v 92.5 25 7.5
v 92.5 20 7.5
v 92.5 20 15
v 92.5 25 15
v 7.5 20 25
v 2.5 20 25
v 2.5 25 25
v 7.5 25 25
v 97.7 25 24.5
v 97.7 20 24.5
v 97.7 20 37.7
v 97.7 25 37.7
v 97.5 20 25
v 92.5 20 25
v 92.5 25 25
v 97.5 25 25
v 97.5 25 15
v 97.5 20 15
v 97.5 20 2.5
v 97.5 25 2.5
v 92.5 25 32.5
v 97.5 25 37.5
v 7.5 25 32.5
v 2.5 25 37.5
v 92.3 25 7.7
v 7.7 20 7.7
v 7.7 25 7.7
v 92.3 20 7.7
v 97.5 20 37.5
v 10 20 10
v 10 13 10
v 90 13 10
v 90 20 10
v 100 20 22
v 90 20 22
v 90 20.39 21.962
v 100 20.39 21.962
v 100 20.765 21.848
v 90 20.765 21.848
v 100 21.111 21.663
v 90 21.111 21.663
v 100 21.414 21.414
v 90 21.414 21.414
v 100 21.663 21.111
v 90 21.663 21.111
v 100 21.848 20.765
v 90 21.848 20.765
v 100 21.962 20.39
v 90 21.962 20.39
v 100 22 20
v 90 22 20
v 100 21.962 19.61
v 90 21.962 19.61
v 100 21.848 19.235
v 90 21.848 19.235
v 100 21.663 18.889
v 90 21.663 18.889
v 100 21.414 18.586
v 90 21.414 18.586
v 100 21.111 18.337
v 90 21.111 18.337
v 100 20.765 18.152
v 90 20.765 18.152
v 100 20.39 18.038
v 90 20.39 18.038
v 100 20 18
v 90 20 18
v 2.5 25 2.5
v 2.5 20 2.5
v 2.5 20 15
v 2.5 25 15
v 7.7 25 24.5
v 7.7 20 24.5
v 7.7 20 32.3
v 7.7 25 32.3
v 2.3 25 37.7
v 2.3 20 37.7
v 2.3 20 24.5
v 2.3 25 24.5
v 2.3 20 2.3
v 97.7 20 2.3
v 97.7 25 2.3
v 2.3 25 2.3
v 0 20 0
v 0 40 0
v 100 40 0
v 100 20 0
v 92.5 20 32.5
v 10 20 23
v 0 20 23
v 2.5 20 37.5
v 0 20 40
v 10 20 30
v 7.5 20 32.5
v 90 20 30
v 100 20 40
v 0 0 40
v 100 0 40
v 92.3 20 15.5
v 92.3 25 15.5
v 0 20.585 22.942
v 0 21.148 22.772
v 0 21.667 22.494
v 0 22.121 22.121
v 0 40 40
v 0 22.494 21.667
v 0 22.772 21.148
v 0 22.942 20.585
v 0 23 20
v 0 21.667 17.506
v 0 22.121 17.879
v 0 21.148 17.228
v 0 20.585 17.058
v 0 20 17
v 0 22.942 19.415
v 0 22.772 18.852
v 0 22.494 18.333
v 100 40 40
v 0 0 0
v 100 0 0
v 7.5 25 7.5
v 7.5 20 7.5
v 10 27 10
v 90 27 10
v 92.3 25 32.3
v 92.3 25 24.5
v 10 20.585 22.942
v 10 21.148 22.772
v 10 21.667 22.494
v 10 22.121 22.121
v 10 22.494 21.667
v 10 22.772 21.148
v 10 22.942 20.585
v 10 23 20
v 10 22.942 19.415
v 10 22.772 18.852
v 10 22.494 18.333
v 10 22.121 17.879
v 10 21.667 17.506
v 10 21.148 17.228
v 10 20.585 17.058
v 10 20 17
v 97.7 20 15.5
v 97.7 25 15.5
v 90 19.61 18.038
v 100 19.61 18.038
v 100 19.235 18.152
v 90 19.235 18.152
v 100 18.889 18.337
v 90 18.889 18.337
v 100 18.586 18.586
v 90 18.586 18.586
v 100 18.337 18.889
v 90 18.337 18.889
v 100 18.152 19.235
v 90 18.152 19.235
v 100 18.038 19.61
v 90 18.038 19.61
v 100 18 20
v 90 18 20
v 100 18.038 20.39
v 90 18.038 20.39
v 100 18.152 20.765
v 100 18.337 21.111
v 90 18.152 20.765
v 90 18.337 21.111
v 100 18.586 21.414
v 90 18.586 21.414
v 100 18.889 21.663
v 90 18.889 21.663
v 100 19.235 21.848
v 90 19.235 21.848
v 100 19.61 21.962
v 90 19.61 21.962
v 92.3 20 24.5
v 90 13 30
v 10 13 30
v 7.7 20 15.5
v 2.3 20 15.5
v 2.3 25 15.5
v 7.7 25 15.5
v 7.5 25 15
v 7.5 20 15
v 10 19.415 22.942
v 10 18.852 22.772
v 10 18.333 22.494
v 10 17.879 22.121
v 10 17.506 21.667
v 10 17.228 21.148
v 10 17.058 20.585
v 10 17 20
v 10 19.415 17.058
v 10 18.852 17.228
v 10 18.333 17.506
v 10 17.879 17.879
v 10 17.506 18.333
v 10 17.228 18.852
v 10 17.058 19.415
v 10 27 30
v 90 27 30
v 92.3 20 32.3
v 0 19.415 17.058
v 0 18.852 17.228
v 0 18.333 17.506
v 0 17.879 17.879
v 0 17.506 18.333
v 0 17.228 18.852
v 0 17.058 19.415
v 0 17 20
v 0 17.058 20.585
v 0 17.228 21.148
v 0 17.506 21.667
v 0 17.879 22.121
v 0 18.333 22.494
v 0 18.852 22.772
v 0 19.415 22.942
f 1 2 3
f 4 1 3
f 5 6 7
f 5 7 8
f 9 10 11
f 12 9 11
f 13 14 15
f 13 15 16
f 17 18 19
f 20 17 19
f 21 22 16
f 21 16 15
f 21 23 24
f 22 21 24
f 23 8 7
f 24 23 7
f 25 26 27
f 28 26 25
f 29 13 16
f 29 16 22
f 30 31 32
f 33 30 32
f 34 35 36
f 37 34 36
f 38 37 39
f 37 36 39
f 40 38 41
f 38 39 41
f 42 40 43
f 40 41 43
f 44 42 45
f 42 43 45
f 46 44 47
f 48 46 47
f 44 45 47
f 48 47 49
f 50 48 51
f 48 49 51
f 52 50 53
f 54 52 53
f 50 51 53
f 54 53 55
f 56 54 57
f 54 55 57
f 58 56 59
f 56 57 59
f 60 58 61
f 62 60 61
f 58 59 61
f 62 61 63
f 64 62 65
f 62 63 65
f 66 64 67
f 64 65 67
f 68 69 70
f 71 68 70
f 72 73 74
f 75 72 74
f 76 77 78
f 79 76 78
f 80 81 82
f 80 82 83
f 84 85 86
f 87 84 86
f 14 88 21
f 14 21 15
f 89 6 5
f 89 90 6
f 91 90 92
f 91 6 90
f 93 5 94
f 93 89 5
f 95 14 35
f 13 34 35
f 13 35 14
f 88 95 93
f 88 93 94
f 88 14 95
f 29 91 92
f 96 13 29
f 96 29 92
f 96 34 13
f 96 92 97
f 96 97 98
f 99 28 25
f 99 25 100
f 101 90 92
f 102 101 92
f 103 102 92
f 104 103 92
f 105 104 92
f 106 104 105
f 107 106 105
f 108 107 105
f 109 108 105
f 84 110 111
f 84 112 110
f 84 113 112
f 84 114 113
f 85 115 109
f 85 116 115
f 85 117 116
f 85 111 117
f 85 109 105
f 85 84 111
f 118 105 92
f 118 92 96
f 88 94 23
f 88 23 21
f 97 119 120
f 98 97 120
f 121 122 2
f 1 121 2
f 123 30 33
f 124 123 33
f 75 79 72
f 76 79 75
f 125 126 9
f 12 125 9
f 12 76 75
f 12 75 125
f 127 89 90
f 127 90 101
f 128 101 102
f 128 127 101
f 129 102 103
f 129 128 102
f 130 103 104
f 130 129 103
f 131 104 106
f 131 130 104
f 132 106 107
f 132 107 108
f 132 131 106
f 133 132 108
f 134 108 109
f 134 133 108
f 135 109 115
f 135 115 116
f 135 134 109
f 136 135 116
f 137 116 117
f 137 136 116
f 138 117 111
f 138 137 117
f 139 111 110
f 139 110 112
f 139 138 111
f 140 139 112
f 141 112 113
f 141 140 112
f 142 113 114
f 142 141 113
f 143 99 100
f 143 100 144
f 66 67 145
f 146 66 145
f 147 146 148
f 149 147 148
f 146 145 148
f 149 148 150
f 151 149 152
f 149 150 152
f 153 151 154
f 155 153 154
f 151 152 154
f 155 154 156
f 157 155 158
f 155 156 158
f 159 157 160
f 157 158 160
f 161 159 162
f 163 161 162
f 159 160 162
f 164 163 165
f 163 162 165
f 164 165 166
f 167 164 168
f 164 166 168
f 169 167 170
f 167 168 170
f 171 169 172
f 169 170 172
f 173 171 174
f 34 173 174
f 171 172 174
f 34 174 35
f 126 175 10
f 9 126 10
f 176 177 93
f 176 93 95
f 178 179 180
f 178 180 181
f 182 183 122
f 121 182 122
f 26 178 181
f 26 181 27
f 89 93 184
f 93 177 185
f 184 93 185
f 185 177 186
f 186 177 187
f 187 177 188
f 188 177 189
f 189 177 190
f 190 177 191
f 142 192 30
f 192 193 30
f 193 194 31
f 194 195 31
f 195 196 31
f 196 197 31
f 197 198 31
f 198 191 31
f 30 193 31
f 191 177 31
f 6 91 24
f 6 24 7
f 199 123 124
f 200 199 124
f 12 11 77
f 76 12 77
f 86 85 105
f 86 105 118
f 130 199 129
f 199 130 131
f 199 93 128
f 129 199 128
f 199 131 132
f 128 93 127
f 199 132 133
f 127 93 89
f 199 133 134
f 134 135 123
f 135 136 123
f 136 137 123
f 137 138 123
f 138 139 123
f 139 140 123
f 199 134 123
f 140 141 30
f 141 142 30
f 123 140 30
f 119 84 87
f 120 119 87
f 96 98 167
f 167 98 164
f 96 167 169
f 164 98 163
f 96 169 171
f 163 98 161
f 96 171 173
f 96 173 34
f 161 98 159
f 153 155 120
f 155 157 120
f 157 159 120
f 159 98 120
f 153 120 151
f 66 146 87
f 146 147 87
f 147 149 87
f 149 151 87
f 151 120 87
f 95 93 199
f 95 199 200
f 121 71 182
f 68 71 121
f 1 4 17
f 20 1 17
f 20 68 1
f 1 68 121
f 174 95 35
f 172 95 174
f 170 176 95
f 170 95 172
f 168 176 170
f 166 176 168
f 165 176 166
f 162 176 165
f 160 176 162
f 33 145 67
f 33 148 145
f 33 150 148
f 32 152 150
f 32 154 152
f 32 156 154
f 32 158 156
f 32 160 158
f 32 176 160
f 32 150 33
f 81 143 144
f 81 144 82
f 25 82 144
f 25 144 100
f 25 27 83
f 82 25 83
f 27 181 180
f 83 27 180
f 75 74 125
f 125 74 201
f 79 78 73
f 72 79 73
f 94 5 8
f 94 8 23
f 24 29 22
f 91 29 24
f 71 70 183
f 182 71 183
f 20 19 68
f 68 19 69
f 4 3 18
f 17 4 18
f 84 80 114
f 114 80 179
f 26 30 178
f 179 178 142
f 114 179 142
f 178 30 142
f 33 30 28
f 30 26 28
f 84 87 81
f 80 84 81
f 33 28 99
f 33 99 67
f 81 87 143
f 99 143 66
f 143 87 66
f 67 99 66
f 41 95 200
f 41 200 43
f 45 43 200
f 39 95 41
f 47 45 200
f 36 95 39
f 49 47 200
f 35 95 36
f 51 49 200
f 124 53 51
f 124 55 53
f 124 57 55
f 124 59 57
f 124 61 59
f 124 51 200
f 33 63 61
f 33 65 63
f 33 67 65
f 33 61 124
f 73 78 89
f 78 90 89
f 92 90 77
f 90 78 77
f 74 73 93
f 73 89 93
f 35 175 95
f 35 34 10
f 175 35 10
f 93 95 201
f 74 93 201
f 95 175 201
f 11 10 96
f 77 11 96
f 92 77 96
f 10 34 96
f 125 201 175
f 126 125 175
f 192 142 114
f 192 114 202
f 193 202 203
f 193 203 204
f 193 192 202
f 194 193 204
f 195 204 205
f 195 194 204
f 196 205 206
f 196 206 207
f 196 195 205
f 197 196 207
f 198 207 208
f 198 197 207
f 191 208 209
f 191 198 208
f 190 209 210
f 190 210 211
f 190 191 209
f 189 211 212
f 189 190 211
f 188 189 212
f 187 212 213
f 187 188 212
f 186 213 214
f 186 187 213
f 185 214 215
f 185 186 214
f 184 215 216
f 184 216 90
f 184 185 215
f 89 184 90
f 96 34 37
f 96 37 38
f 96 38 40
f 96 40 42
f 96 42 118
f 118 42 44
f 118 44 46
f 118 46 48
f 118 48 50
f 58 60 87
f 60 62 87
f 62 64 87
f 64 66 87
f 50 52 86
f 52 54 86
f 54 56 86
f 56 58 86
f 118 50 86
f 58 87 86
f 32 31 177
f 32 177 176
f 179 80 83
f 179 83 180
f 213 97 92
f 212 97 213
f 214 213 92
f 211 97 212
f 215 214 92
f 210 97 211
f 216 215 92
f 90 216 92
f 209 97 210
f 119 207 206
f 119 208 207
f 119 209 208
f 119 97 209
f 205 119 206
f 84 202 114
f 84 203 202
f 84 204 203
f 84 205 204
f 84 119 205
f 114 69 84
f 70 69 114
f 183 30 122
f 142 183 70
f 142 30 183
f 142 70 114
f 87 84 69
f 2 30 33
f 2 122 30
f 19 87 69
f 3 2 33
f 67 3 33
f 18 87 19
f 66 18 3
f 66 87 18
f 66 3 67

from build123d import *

# Parameters (mm, degrees)
SKETCH_1_W               = 100
SKETCH_1_H               = 40
EXTRUDE_1_DEPTH          = 40
CUT_EXTRUDE_1_DEPTH      = 7
CUT_EXTRUDE_1_DEPTH_BACK = 7
SKETCH_2_W               = 80
SKETCH_2_H               = 20
EXTRUDE_2_DEPTH          = 5
CUT_EXTRUDE_2_DEPTH      = 5
SKETCH_6_R               = 2
CUT_EXTRUDE_3_DEPTH      = 115.891252931
CUT_EXTRUDE_START        = -10
SKETCH_7_R               = 3
CUT_EXTRUDE_4_DEPTH      = 10


with BuildPart() as part:
    # ｽｹｯﾁ1 → ﾎﾞｽ - 押し出し1 (new body)
    with BuildSketch(Plane.XY):
        with Locations((50, 20)):
            Rectangle(SKETCH_1_W, SKETCH_1_H)
    extrude(amount=EXTRUDE_1_DEPTH)


with BuildPart() as body_2:
    # Split Bodies 1: the piece on the far side of the plane
    add(part.part)
    split(bisect_by=Plane.ZX.offset(20), keep=Keep.BOTTOM)


with BuildPart() as part_1:
    add(part.part)

    # Split Bodies 1
    split(bisect_by=Plane.ZX.offset(20), keep=Keep.TOP)


with BuildPart() as cut_extrude_1_tool:
    # ｽｹｯﾁ2 → ｶｯﾄ - 押し出し1 (new, two sides: drawn at the far end of the back side and taken through both)
    with BuildSketch(Plane(origin=(0, 20, 0), x_dir=(1, 0, 0), z_dir=(0, 1, 0)).offset(-CUT_EXTRUDE_1_DEPTH_BACK)):
        with Locations((50, -20)):
            Rectangle(SKETCH_2_W, SKETCH_2_H)
    extrude(amount=CUT_EXTRUDE_1_DEPTH + CUT_EXTRUDE_1_DEPTH_BACK)


with BuildPart() as part_2:
    add(part_1.part)

    # ｶｯﾄ - 押し出し1: cut by cut_extrude_1_tool
    add(cut_extrude_1_tool.part, mode=Mode.SUBTRACT)

    # ｽｹｯﾁ4 → ｶｯﾄ - 押し出し2 (cut)
    with BuildSketch(Plane.XZ.offset(-20)):
        Polygon((92.3, 32.3), (92.3, 24.5), (97.7, 24.5), (97.7, 37.7), (2.3, 37.7), (2.3, 24.5), (7.7, 24.5), (7.7, 32.3), align=None)
        Polygon((7.7, 7.7), (92.3, 7.7), (92.3, 15.5), (97.7, 15.5), (97.7, 2.3), (2.3, 2.3), (2.3, 15.5), (7.7, 15.5), align=None)
    extrude(amount=-CUT_EXTRUDE_2_DEPTH, mode=Mode.SUBTRACT)


with BuildPart() as body_2_1:
    add(body_2.part)

    # ｶｯﾄ - 押し出し1: cut by cut_extrude_1_tool
    add(cut_extrude_1_tool.part, mode=Mode.SUBTRACT)

    # ｽｹｯﾁ3 → ﾎﾞｽ - 押し出し2 (add)
    with BuildSketch(Plane(origin=(0, 20, 0), x_dir=(1, 0, 0), z_dir=(0, 1, 0))):
        Polygon((7.5, -32.5), (92.5, -32.5), (92.5, -25), (97.5, -25), (97.5, -37.5), (2.5, -37.5), (2.5, -25), (7.5, -25), align=None)
        Polygon((7.5, -7.5), (92.5, -7.5), (92.5, -15), (97.5, -15), (97.5, -2.5), (2.5, -2.5), (2.5, -15), (7.5, -15), align=None)
    extrude(amount=EXTRUDE_2_DEPTH)


with BuildPart() as cut_extrude_3_tool:
    # ｽｹｯﾁ6 → ｶｯﾄ - 押し出し3 (new, through all)
    with BuildSketch(Plane.ZY):
        with Locations((20, 20)):
            Circle(SKETCH_6_R)
    extrude(amount=-CUT_EXTRUDE_3_DEPTH)


with BuildPart() as part_3:
    add(part_2.part)

    # ｶｯﾄ - 押し出し3: cut by cut_extrude_3_tool
    add(cut_extrude_3_tool.part, mode=Mode.SUBTRACT)


with BuildPart() as body_2_2:
    add(body_2_1.part)

    # ｶｯﾄ - 押し出し3: cut by cut_extrude_3_tool
    add(cut_extrude_3_tool.part, mode=Mode.SUBTRACT)


with BuildPart() as cut_extrude_4_tool:
    # ｽｹｯﾁ7 → ｶｯﾄ - 押し出し4 (new body)
    with BuildSketch(Plane.ZY.offset(CUT_EXTRUDE_START)):
        with Locations((20, 20)):
            Circle(SKETCH_7_R)
    extrude(amount=CUT_EXTRUDE_4_DEPTH)


with BuildPart() as part_4:
    add(part_3.part)

    # ｶｯﾄ - 押し出し4: cut by cut_extrude_4_tool
    add(cut_extrude_4_tool.part, mode=Mode.SUBTRACT)


with BuildPart() as body_2_3:
    add(body_2_2.part)

    # ｶｯﾄ - 押し出し4: cut by cut_extrude_4_tool
    add(cut_extrude_4_tool.part, mode=Mode.SUBTRACT)


solid = Compound([part_4.part, body_2_3.part])
